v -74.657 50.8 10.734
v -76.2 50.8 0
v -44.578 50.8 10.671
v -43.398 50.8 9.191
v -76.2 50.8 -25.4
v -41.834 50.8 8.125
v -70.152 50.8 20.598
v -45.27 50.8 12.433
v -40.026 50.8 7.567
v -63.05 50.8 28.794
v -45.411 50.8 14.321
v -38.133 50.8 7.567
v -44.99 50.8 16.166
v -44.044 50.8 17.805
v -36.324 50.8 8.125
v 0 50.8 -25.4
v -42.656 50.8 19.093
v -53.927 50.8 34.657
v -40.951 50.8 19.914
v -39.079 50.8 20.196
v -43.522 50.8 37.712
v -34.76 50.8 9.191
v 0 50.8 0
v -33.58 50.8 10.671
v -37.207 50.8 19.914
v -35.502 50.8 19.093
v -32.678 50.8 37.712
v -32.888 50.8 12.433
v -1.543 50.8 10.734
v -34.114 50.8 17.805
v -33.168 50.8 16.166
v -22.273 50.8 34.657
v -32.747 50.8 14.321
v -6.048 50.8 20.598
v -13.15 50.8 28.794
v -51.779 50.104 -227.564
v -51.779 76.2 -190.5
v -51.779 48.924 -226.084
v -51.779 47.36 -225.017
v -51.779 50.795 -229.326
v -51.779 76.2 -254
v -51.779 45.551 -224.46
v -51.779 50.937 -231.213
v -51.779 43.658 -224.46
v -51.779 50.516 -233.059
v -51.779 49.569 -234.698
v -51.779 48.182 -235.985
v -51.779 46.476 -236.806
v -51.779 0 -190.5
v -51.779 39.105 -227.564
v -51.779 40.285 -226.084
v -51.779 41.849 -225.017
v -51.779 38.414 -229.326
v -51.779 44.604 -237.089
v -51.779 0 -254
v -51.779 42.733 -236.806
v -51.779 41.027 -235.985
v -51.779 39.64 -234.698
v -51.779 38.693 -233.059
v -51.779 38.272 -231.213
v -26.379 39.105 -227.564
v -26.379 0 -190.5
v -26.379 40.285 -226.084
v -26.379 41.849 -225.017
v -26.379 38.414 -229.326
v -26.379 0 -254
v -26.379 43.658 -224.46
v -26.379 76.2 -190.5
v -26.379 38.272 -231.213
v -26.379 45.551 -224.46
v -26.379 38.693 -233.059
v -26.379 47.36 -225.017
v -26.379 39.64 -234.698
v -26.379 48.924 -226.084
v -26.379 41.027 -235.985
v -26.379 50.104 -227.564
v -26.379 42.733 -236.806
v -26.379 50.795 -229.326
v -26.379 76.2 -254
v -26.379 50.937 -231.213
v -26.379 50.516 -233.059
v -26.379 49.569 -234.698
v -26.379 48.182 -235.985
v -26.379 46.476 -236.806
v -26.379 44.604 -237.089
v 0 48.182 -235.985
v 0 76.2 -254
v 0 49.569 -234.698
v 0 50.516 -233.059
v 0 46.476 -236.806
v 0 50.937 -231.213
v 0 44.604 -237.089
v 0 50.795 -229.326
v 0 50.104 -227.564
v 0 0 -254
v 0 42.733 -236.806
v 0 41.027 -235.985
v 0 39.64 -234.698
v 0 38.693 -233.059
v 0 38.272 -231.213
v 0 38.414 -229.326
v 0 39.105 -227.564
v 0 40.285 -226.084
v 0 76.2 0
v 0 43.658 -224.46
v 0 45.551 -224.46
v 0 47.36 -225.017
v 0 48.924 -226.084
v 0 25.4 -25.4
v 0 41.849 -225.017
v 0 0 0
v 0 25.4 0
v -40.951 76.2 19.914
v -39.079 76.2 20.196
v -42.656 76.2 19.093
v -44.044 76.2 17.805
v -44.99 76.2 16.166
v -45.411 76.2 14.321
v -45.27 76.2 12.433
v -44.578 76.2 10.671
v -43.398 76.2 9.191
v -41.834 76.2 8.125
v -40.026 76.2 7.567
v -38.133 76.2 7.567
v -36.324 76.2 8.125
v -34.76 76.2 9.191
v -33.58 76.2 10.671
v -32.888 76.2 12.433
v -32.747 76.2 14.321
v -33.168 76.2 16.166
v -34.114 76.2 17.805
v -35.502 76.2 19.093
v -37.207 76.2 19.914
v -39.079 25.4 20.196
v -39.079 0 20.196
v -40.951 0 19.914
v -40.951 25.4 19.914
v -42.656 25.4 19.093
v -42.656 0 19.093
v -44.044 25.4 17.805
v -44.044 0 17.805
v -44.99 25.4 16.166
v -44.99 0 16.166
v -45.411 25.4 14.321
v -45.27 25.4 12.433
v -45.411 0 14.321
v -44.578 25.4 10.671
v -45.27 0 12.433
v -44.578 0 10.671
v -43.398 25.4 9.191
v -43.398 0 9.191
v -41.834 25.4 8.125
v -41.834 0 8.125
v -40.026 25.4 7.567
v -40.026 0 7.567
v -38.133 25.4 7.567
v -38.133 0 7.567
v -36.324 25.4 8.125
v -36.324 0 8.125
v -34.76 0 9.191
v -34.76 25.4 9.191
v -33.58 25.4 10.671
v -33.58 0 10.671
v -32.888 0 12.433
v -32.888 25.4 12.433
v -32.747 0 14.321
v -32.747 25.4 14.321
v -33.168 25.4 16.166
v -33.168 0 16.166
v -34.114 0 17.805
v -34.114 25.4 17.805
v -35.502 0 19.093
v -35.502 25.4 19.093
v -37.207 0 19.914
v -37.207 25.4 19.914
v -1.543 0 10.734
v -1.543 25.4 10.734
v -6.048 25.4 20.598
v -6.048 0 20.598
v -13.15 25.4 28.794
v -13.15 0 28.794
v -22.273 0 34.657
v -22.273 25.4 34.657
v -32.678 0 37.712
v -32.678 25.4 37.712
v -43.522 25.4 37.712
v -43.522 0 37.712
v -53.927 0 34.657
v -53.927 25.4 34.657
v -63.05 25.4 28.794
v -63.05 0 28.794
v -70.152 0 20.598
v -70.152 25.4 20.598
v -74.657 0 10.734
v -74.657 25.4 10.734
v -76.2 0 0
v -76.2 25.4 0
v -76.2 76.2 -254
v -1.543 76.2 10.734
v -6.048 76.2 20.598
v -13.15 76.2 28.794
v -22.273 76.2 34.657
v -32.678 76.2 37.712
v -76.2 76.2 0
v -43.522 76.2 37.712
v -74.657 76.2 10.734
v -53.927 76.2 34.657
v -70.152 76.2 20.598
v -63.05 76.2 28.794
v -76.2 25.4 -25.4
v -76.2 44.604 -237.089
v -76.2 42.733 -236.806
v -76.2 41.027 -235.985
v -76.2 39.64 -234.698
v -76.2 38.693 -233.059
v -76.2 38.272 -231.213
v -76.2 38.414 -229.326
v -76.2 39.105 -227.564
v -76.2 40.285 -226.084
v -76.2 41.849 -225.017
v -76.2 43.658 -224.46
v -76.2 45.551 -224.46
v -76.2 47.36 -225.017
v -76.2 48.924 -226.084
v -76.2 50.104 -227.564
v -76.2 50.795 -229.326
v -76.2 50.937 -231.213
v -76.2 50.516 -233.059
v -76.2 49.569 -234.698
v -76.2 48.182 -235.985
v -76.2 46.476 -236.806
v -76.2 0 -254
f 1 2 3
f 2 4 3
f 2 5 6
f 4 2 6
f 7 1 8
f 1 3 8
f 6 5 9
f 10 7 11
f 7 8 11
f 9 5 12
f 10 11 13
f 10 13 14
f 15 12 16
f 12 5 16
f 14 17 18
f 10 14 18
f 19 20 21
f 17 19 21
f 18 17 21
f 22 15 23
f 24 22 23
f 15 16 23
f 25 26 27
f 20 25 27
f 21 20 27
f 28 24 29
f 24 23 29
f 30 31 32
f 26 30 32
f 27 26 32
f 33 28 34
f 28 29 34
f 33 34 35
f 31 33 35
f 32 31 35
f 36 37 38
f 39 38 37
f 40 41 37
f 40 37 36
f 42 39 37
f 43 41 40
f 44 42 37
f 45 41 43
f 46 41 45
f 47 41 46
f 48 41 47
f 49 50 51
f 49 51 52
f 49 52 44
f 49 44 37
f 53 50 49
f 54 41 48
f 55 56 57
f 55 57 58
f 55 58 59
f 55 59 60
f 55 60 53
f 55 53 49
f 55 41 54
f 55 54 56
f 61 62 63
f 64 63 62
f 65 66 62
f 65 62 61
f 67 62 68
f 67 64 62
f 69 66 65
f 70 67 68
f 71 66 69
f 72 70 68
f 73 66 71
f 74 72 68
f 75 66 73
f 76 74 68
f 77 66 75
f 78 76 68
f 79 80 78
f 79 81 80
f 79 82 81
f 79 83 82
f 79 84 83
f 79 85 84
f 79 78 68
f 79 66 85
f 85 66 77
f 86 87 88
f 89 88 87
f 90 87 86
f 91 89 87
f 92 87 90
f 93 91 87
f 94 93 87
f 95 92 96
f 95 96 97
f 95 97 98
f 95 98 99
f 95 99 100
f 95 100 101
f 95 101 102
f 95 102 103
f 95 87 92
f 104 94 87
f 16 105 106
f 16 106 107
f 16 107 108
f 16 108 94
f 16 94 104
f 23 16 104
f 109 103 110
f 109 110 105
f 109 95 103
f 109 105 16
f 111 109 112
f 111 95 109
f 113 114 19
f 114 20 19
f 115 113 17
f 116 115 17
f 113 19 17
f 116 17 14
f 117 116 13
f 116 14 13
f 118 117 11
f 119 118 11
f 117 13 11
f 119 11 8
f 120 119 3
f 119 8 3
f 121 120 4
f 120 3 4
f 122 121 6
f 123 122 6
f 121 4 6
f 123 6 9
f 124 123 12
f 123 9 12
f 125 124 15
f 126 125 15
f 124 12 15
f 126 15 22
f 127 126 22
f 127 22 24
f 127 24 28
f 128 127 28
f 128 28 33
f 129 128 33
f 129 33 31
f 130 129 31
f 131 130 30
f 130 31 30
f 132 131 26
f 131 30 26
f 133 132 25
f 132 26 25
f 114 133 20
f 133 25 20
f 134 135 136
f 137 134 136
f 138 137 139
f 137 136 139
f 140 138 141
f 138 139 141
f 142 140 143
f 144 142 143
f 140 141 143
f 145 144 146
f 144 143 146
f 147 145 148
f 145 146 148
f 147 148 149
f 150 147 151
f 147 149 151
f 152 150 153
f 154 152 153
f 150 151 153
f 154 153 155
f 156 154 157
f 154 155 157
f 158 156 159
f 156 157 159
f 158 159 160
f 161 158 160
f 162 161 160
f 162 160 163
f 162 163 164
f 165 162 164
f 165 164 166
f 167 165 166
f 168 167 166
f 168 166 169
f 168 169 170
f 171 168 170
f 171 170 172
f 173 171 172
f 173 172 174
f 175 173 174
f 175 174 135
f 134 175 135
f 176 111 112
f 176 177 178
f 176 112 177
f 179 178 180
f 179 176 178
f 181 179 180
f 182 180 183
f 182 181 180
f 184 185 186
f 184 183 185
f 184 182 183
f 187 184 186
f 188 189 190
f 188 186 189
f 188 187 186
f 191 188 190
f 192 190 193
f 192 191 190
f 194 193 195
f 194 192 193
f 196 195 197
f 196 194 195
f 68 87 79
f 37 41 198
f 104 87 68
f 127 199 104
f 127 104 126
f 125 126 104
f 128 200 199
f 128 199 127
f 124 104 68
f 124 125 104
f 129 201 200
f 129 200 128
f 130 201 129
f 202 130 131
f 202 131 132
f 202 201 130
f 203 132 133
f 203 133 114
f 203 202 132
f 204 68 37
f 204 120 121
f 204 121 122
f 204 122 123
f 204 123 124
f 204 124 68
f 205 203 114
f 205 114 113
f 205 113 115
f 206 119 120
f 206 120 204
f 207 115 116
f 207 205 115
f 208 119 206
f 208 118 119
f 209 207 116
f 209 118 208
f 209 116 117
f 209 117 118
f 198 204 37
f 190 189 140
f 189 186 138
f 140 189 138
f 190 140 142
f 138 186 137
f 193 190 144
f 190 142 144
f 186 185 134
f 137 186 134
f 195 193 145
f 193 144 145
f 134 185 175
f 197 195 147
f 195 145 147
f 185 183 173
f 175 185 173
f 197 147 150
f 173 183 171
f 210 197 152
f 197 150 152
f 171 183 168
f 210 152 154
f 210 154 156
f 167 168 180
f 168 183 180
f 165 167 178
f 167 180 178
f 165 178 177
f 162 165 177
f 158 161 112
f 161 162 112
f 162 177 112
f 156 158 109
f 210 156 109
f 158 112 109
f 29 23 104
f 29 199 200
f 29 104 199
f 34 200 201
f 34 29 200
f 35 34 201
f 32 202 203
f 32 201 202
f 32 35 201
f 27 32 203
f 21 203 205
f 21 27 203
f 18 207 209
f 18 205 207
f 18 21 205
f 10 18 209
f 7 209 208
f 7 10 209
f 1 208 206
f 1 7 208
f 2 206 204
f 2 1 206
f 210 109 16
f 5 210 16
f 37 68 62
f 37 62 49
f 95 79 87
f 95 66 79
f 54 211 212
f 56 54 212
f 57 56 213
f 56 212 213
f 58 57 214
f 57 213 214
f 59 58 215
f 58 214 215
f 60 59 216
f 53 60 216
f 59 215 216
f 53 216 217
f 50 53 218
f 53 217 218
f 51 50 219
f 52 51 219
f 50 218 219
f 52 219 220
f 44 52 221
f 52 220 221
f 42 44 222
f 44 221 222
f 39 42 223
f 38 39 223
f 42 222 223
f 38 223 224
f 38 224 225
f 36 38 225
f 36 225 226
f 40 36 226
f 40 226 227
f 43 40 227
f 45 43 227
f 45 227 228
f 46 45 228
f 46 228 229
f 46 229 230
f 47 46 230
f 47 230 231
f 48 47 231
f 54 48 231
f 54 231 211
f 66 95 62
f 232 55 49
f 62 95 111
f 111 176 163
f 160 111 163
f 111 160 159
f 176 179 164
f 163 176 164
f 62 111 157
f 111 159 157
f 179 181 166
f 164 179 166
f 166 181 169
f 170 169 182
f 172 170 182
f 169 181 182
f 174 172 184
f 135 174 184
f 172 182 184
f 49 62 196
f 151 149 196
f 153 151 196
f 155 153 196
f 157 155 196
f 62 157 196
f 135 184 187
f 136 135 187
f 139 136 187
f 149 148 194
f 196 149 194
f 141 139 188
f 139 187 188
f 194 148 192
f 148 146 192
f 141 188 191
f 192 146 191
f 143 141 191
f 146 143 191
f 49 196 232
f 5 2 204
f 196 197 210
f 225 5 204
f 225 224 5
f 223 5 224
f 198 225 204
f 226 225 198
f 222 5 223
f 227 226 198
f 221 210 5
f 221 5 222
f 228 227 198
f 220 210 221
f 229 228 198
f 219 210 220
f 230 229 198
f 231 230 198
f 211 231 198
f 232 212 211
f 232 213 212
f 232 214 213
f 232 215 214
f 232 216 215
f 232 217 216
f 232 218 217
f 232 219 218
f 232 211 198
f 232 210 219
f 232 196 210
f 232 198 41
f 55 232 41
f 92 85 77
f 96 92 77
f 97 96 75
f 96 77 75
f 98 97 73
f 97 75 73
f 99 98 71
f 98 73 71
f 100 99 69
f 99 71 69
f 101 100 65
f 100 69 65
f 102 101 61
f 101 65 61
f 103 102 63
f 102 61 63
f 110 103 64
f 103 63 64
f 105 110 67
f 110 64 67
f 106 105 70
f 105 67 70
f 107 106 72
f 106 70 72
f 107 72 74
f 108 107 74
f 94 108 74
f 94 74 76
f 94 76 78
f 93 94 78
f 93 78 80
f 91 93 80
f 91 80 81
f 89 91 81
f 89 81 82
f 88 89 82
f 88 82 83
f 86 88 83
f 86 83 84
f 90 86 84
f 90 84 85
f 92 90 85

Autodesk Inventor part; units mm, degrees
ref_plane "YZ Plane" through (0, 0, 0) normal (1, 0, 0) x (0, 1, 0)
ref_plane "XZ Plane" through (0, 0, 0) normal (0, 1, 0) x (-1, 0, 0)
ref_plane "XY Plane" through (0, 0, 0) normal (0, 0, 1) x (1, 0, 0)
sketch "Sketch1" plane through (0, 0, 0) normal (0, 1, 0) x (-1, 0, 0)
  line L0 (76.2, 0) -> (76.2, -254)
  line L1 (76.2, -254) -> (0, -254)
  line L2 (0, -254) -> (0, 0)
  arc A0 (76.2, 0) -> (0, 0) centre (38.1, 0) ccw
extrude "Extrusion1" add sketch "Sketch1" along normal blind 76.2
sketch "Sketch2" plane through (0, 0, 0) normal (1, 0, 0) x (0, 0, -1)
  line L0 (-38.1, 25.4) -> (25.4, 25.4)
  line L1 (25.4, 25.4) -> (25.4, 50.8)
  line L2 (25.4, 50.8) -> (-38.1, 50.8)
  line L3 (-38.1, 0) -> (-38.1, 76.2) projected
  line L4 (-38.1, 38.1) -> (25.4, 50.8) construction
  line L5 (25.4, 25.4) -> (-38.1, 38.1) construction
  line L6 (-38.1, 50.8) -> (-38.1, 25.4)
  point P0 (0, 0)
extrude "Extrusion2" cut sketch "Sketch2" against normal blind 111.125
sketch "Sketch3" plane through (0, 76.2, 0) normal (0, 1, 0) x (1, 0, 0)
  point P0 (0, 0)
  point P1 (-39.0791, -13.8463)
hole "Hole1" at (-39.0791, 76.2, 13.8463) direction (0, -1, 0) diameter 12.7 depth 98.425 tip angle 118
sketch "Sketch5" plane through (0, 0, -254) normal (0, 0, -1) x (-1, 0, 0)
  line L0 (76.2, 0) -> (0, 0) projected
  line L1 (51.7791, 76.2) -> (51.7791, 0)
  line L2 (51.7791, 0) -> (26.3791, 0)
  line L3 (26.3791, 0) -> (26.3791, 76.2)
  line L4 (32.7291, 76.2) -> (45.4291, 76.2) projected
  line L5 (76.2, 76.2) -> (0, 76.2) projected
  line L6 (51.7791, 76.2) -> (24.7587, 76.2)
  point P0 (39.0791, 76.2)
extrude "Extrusion3" cut sketch "Sketch5" against normal blind 63.5
sketch "Sketch6" plane through (0, 0, 0) normal (1, 0, 0) x (0, 0, -1)
  point P0 (0, 0)
  point P1 (230.7386, 44.6045)
hole "Hole2" at (0, 44.6045, -230.7386) direction (-1, 0, 0) diameter 12.7 depth 98.425 tip angle 118
properties part number "SecondChain"
